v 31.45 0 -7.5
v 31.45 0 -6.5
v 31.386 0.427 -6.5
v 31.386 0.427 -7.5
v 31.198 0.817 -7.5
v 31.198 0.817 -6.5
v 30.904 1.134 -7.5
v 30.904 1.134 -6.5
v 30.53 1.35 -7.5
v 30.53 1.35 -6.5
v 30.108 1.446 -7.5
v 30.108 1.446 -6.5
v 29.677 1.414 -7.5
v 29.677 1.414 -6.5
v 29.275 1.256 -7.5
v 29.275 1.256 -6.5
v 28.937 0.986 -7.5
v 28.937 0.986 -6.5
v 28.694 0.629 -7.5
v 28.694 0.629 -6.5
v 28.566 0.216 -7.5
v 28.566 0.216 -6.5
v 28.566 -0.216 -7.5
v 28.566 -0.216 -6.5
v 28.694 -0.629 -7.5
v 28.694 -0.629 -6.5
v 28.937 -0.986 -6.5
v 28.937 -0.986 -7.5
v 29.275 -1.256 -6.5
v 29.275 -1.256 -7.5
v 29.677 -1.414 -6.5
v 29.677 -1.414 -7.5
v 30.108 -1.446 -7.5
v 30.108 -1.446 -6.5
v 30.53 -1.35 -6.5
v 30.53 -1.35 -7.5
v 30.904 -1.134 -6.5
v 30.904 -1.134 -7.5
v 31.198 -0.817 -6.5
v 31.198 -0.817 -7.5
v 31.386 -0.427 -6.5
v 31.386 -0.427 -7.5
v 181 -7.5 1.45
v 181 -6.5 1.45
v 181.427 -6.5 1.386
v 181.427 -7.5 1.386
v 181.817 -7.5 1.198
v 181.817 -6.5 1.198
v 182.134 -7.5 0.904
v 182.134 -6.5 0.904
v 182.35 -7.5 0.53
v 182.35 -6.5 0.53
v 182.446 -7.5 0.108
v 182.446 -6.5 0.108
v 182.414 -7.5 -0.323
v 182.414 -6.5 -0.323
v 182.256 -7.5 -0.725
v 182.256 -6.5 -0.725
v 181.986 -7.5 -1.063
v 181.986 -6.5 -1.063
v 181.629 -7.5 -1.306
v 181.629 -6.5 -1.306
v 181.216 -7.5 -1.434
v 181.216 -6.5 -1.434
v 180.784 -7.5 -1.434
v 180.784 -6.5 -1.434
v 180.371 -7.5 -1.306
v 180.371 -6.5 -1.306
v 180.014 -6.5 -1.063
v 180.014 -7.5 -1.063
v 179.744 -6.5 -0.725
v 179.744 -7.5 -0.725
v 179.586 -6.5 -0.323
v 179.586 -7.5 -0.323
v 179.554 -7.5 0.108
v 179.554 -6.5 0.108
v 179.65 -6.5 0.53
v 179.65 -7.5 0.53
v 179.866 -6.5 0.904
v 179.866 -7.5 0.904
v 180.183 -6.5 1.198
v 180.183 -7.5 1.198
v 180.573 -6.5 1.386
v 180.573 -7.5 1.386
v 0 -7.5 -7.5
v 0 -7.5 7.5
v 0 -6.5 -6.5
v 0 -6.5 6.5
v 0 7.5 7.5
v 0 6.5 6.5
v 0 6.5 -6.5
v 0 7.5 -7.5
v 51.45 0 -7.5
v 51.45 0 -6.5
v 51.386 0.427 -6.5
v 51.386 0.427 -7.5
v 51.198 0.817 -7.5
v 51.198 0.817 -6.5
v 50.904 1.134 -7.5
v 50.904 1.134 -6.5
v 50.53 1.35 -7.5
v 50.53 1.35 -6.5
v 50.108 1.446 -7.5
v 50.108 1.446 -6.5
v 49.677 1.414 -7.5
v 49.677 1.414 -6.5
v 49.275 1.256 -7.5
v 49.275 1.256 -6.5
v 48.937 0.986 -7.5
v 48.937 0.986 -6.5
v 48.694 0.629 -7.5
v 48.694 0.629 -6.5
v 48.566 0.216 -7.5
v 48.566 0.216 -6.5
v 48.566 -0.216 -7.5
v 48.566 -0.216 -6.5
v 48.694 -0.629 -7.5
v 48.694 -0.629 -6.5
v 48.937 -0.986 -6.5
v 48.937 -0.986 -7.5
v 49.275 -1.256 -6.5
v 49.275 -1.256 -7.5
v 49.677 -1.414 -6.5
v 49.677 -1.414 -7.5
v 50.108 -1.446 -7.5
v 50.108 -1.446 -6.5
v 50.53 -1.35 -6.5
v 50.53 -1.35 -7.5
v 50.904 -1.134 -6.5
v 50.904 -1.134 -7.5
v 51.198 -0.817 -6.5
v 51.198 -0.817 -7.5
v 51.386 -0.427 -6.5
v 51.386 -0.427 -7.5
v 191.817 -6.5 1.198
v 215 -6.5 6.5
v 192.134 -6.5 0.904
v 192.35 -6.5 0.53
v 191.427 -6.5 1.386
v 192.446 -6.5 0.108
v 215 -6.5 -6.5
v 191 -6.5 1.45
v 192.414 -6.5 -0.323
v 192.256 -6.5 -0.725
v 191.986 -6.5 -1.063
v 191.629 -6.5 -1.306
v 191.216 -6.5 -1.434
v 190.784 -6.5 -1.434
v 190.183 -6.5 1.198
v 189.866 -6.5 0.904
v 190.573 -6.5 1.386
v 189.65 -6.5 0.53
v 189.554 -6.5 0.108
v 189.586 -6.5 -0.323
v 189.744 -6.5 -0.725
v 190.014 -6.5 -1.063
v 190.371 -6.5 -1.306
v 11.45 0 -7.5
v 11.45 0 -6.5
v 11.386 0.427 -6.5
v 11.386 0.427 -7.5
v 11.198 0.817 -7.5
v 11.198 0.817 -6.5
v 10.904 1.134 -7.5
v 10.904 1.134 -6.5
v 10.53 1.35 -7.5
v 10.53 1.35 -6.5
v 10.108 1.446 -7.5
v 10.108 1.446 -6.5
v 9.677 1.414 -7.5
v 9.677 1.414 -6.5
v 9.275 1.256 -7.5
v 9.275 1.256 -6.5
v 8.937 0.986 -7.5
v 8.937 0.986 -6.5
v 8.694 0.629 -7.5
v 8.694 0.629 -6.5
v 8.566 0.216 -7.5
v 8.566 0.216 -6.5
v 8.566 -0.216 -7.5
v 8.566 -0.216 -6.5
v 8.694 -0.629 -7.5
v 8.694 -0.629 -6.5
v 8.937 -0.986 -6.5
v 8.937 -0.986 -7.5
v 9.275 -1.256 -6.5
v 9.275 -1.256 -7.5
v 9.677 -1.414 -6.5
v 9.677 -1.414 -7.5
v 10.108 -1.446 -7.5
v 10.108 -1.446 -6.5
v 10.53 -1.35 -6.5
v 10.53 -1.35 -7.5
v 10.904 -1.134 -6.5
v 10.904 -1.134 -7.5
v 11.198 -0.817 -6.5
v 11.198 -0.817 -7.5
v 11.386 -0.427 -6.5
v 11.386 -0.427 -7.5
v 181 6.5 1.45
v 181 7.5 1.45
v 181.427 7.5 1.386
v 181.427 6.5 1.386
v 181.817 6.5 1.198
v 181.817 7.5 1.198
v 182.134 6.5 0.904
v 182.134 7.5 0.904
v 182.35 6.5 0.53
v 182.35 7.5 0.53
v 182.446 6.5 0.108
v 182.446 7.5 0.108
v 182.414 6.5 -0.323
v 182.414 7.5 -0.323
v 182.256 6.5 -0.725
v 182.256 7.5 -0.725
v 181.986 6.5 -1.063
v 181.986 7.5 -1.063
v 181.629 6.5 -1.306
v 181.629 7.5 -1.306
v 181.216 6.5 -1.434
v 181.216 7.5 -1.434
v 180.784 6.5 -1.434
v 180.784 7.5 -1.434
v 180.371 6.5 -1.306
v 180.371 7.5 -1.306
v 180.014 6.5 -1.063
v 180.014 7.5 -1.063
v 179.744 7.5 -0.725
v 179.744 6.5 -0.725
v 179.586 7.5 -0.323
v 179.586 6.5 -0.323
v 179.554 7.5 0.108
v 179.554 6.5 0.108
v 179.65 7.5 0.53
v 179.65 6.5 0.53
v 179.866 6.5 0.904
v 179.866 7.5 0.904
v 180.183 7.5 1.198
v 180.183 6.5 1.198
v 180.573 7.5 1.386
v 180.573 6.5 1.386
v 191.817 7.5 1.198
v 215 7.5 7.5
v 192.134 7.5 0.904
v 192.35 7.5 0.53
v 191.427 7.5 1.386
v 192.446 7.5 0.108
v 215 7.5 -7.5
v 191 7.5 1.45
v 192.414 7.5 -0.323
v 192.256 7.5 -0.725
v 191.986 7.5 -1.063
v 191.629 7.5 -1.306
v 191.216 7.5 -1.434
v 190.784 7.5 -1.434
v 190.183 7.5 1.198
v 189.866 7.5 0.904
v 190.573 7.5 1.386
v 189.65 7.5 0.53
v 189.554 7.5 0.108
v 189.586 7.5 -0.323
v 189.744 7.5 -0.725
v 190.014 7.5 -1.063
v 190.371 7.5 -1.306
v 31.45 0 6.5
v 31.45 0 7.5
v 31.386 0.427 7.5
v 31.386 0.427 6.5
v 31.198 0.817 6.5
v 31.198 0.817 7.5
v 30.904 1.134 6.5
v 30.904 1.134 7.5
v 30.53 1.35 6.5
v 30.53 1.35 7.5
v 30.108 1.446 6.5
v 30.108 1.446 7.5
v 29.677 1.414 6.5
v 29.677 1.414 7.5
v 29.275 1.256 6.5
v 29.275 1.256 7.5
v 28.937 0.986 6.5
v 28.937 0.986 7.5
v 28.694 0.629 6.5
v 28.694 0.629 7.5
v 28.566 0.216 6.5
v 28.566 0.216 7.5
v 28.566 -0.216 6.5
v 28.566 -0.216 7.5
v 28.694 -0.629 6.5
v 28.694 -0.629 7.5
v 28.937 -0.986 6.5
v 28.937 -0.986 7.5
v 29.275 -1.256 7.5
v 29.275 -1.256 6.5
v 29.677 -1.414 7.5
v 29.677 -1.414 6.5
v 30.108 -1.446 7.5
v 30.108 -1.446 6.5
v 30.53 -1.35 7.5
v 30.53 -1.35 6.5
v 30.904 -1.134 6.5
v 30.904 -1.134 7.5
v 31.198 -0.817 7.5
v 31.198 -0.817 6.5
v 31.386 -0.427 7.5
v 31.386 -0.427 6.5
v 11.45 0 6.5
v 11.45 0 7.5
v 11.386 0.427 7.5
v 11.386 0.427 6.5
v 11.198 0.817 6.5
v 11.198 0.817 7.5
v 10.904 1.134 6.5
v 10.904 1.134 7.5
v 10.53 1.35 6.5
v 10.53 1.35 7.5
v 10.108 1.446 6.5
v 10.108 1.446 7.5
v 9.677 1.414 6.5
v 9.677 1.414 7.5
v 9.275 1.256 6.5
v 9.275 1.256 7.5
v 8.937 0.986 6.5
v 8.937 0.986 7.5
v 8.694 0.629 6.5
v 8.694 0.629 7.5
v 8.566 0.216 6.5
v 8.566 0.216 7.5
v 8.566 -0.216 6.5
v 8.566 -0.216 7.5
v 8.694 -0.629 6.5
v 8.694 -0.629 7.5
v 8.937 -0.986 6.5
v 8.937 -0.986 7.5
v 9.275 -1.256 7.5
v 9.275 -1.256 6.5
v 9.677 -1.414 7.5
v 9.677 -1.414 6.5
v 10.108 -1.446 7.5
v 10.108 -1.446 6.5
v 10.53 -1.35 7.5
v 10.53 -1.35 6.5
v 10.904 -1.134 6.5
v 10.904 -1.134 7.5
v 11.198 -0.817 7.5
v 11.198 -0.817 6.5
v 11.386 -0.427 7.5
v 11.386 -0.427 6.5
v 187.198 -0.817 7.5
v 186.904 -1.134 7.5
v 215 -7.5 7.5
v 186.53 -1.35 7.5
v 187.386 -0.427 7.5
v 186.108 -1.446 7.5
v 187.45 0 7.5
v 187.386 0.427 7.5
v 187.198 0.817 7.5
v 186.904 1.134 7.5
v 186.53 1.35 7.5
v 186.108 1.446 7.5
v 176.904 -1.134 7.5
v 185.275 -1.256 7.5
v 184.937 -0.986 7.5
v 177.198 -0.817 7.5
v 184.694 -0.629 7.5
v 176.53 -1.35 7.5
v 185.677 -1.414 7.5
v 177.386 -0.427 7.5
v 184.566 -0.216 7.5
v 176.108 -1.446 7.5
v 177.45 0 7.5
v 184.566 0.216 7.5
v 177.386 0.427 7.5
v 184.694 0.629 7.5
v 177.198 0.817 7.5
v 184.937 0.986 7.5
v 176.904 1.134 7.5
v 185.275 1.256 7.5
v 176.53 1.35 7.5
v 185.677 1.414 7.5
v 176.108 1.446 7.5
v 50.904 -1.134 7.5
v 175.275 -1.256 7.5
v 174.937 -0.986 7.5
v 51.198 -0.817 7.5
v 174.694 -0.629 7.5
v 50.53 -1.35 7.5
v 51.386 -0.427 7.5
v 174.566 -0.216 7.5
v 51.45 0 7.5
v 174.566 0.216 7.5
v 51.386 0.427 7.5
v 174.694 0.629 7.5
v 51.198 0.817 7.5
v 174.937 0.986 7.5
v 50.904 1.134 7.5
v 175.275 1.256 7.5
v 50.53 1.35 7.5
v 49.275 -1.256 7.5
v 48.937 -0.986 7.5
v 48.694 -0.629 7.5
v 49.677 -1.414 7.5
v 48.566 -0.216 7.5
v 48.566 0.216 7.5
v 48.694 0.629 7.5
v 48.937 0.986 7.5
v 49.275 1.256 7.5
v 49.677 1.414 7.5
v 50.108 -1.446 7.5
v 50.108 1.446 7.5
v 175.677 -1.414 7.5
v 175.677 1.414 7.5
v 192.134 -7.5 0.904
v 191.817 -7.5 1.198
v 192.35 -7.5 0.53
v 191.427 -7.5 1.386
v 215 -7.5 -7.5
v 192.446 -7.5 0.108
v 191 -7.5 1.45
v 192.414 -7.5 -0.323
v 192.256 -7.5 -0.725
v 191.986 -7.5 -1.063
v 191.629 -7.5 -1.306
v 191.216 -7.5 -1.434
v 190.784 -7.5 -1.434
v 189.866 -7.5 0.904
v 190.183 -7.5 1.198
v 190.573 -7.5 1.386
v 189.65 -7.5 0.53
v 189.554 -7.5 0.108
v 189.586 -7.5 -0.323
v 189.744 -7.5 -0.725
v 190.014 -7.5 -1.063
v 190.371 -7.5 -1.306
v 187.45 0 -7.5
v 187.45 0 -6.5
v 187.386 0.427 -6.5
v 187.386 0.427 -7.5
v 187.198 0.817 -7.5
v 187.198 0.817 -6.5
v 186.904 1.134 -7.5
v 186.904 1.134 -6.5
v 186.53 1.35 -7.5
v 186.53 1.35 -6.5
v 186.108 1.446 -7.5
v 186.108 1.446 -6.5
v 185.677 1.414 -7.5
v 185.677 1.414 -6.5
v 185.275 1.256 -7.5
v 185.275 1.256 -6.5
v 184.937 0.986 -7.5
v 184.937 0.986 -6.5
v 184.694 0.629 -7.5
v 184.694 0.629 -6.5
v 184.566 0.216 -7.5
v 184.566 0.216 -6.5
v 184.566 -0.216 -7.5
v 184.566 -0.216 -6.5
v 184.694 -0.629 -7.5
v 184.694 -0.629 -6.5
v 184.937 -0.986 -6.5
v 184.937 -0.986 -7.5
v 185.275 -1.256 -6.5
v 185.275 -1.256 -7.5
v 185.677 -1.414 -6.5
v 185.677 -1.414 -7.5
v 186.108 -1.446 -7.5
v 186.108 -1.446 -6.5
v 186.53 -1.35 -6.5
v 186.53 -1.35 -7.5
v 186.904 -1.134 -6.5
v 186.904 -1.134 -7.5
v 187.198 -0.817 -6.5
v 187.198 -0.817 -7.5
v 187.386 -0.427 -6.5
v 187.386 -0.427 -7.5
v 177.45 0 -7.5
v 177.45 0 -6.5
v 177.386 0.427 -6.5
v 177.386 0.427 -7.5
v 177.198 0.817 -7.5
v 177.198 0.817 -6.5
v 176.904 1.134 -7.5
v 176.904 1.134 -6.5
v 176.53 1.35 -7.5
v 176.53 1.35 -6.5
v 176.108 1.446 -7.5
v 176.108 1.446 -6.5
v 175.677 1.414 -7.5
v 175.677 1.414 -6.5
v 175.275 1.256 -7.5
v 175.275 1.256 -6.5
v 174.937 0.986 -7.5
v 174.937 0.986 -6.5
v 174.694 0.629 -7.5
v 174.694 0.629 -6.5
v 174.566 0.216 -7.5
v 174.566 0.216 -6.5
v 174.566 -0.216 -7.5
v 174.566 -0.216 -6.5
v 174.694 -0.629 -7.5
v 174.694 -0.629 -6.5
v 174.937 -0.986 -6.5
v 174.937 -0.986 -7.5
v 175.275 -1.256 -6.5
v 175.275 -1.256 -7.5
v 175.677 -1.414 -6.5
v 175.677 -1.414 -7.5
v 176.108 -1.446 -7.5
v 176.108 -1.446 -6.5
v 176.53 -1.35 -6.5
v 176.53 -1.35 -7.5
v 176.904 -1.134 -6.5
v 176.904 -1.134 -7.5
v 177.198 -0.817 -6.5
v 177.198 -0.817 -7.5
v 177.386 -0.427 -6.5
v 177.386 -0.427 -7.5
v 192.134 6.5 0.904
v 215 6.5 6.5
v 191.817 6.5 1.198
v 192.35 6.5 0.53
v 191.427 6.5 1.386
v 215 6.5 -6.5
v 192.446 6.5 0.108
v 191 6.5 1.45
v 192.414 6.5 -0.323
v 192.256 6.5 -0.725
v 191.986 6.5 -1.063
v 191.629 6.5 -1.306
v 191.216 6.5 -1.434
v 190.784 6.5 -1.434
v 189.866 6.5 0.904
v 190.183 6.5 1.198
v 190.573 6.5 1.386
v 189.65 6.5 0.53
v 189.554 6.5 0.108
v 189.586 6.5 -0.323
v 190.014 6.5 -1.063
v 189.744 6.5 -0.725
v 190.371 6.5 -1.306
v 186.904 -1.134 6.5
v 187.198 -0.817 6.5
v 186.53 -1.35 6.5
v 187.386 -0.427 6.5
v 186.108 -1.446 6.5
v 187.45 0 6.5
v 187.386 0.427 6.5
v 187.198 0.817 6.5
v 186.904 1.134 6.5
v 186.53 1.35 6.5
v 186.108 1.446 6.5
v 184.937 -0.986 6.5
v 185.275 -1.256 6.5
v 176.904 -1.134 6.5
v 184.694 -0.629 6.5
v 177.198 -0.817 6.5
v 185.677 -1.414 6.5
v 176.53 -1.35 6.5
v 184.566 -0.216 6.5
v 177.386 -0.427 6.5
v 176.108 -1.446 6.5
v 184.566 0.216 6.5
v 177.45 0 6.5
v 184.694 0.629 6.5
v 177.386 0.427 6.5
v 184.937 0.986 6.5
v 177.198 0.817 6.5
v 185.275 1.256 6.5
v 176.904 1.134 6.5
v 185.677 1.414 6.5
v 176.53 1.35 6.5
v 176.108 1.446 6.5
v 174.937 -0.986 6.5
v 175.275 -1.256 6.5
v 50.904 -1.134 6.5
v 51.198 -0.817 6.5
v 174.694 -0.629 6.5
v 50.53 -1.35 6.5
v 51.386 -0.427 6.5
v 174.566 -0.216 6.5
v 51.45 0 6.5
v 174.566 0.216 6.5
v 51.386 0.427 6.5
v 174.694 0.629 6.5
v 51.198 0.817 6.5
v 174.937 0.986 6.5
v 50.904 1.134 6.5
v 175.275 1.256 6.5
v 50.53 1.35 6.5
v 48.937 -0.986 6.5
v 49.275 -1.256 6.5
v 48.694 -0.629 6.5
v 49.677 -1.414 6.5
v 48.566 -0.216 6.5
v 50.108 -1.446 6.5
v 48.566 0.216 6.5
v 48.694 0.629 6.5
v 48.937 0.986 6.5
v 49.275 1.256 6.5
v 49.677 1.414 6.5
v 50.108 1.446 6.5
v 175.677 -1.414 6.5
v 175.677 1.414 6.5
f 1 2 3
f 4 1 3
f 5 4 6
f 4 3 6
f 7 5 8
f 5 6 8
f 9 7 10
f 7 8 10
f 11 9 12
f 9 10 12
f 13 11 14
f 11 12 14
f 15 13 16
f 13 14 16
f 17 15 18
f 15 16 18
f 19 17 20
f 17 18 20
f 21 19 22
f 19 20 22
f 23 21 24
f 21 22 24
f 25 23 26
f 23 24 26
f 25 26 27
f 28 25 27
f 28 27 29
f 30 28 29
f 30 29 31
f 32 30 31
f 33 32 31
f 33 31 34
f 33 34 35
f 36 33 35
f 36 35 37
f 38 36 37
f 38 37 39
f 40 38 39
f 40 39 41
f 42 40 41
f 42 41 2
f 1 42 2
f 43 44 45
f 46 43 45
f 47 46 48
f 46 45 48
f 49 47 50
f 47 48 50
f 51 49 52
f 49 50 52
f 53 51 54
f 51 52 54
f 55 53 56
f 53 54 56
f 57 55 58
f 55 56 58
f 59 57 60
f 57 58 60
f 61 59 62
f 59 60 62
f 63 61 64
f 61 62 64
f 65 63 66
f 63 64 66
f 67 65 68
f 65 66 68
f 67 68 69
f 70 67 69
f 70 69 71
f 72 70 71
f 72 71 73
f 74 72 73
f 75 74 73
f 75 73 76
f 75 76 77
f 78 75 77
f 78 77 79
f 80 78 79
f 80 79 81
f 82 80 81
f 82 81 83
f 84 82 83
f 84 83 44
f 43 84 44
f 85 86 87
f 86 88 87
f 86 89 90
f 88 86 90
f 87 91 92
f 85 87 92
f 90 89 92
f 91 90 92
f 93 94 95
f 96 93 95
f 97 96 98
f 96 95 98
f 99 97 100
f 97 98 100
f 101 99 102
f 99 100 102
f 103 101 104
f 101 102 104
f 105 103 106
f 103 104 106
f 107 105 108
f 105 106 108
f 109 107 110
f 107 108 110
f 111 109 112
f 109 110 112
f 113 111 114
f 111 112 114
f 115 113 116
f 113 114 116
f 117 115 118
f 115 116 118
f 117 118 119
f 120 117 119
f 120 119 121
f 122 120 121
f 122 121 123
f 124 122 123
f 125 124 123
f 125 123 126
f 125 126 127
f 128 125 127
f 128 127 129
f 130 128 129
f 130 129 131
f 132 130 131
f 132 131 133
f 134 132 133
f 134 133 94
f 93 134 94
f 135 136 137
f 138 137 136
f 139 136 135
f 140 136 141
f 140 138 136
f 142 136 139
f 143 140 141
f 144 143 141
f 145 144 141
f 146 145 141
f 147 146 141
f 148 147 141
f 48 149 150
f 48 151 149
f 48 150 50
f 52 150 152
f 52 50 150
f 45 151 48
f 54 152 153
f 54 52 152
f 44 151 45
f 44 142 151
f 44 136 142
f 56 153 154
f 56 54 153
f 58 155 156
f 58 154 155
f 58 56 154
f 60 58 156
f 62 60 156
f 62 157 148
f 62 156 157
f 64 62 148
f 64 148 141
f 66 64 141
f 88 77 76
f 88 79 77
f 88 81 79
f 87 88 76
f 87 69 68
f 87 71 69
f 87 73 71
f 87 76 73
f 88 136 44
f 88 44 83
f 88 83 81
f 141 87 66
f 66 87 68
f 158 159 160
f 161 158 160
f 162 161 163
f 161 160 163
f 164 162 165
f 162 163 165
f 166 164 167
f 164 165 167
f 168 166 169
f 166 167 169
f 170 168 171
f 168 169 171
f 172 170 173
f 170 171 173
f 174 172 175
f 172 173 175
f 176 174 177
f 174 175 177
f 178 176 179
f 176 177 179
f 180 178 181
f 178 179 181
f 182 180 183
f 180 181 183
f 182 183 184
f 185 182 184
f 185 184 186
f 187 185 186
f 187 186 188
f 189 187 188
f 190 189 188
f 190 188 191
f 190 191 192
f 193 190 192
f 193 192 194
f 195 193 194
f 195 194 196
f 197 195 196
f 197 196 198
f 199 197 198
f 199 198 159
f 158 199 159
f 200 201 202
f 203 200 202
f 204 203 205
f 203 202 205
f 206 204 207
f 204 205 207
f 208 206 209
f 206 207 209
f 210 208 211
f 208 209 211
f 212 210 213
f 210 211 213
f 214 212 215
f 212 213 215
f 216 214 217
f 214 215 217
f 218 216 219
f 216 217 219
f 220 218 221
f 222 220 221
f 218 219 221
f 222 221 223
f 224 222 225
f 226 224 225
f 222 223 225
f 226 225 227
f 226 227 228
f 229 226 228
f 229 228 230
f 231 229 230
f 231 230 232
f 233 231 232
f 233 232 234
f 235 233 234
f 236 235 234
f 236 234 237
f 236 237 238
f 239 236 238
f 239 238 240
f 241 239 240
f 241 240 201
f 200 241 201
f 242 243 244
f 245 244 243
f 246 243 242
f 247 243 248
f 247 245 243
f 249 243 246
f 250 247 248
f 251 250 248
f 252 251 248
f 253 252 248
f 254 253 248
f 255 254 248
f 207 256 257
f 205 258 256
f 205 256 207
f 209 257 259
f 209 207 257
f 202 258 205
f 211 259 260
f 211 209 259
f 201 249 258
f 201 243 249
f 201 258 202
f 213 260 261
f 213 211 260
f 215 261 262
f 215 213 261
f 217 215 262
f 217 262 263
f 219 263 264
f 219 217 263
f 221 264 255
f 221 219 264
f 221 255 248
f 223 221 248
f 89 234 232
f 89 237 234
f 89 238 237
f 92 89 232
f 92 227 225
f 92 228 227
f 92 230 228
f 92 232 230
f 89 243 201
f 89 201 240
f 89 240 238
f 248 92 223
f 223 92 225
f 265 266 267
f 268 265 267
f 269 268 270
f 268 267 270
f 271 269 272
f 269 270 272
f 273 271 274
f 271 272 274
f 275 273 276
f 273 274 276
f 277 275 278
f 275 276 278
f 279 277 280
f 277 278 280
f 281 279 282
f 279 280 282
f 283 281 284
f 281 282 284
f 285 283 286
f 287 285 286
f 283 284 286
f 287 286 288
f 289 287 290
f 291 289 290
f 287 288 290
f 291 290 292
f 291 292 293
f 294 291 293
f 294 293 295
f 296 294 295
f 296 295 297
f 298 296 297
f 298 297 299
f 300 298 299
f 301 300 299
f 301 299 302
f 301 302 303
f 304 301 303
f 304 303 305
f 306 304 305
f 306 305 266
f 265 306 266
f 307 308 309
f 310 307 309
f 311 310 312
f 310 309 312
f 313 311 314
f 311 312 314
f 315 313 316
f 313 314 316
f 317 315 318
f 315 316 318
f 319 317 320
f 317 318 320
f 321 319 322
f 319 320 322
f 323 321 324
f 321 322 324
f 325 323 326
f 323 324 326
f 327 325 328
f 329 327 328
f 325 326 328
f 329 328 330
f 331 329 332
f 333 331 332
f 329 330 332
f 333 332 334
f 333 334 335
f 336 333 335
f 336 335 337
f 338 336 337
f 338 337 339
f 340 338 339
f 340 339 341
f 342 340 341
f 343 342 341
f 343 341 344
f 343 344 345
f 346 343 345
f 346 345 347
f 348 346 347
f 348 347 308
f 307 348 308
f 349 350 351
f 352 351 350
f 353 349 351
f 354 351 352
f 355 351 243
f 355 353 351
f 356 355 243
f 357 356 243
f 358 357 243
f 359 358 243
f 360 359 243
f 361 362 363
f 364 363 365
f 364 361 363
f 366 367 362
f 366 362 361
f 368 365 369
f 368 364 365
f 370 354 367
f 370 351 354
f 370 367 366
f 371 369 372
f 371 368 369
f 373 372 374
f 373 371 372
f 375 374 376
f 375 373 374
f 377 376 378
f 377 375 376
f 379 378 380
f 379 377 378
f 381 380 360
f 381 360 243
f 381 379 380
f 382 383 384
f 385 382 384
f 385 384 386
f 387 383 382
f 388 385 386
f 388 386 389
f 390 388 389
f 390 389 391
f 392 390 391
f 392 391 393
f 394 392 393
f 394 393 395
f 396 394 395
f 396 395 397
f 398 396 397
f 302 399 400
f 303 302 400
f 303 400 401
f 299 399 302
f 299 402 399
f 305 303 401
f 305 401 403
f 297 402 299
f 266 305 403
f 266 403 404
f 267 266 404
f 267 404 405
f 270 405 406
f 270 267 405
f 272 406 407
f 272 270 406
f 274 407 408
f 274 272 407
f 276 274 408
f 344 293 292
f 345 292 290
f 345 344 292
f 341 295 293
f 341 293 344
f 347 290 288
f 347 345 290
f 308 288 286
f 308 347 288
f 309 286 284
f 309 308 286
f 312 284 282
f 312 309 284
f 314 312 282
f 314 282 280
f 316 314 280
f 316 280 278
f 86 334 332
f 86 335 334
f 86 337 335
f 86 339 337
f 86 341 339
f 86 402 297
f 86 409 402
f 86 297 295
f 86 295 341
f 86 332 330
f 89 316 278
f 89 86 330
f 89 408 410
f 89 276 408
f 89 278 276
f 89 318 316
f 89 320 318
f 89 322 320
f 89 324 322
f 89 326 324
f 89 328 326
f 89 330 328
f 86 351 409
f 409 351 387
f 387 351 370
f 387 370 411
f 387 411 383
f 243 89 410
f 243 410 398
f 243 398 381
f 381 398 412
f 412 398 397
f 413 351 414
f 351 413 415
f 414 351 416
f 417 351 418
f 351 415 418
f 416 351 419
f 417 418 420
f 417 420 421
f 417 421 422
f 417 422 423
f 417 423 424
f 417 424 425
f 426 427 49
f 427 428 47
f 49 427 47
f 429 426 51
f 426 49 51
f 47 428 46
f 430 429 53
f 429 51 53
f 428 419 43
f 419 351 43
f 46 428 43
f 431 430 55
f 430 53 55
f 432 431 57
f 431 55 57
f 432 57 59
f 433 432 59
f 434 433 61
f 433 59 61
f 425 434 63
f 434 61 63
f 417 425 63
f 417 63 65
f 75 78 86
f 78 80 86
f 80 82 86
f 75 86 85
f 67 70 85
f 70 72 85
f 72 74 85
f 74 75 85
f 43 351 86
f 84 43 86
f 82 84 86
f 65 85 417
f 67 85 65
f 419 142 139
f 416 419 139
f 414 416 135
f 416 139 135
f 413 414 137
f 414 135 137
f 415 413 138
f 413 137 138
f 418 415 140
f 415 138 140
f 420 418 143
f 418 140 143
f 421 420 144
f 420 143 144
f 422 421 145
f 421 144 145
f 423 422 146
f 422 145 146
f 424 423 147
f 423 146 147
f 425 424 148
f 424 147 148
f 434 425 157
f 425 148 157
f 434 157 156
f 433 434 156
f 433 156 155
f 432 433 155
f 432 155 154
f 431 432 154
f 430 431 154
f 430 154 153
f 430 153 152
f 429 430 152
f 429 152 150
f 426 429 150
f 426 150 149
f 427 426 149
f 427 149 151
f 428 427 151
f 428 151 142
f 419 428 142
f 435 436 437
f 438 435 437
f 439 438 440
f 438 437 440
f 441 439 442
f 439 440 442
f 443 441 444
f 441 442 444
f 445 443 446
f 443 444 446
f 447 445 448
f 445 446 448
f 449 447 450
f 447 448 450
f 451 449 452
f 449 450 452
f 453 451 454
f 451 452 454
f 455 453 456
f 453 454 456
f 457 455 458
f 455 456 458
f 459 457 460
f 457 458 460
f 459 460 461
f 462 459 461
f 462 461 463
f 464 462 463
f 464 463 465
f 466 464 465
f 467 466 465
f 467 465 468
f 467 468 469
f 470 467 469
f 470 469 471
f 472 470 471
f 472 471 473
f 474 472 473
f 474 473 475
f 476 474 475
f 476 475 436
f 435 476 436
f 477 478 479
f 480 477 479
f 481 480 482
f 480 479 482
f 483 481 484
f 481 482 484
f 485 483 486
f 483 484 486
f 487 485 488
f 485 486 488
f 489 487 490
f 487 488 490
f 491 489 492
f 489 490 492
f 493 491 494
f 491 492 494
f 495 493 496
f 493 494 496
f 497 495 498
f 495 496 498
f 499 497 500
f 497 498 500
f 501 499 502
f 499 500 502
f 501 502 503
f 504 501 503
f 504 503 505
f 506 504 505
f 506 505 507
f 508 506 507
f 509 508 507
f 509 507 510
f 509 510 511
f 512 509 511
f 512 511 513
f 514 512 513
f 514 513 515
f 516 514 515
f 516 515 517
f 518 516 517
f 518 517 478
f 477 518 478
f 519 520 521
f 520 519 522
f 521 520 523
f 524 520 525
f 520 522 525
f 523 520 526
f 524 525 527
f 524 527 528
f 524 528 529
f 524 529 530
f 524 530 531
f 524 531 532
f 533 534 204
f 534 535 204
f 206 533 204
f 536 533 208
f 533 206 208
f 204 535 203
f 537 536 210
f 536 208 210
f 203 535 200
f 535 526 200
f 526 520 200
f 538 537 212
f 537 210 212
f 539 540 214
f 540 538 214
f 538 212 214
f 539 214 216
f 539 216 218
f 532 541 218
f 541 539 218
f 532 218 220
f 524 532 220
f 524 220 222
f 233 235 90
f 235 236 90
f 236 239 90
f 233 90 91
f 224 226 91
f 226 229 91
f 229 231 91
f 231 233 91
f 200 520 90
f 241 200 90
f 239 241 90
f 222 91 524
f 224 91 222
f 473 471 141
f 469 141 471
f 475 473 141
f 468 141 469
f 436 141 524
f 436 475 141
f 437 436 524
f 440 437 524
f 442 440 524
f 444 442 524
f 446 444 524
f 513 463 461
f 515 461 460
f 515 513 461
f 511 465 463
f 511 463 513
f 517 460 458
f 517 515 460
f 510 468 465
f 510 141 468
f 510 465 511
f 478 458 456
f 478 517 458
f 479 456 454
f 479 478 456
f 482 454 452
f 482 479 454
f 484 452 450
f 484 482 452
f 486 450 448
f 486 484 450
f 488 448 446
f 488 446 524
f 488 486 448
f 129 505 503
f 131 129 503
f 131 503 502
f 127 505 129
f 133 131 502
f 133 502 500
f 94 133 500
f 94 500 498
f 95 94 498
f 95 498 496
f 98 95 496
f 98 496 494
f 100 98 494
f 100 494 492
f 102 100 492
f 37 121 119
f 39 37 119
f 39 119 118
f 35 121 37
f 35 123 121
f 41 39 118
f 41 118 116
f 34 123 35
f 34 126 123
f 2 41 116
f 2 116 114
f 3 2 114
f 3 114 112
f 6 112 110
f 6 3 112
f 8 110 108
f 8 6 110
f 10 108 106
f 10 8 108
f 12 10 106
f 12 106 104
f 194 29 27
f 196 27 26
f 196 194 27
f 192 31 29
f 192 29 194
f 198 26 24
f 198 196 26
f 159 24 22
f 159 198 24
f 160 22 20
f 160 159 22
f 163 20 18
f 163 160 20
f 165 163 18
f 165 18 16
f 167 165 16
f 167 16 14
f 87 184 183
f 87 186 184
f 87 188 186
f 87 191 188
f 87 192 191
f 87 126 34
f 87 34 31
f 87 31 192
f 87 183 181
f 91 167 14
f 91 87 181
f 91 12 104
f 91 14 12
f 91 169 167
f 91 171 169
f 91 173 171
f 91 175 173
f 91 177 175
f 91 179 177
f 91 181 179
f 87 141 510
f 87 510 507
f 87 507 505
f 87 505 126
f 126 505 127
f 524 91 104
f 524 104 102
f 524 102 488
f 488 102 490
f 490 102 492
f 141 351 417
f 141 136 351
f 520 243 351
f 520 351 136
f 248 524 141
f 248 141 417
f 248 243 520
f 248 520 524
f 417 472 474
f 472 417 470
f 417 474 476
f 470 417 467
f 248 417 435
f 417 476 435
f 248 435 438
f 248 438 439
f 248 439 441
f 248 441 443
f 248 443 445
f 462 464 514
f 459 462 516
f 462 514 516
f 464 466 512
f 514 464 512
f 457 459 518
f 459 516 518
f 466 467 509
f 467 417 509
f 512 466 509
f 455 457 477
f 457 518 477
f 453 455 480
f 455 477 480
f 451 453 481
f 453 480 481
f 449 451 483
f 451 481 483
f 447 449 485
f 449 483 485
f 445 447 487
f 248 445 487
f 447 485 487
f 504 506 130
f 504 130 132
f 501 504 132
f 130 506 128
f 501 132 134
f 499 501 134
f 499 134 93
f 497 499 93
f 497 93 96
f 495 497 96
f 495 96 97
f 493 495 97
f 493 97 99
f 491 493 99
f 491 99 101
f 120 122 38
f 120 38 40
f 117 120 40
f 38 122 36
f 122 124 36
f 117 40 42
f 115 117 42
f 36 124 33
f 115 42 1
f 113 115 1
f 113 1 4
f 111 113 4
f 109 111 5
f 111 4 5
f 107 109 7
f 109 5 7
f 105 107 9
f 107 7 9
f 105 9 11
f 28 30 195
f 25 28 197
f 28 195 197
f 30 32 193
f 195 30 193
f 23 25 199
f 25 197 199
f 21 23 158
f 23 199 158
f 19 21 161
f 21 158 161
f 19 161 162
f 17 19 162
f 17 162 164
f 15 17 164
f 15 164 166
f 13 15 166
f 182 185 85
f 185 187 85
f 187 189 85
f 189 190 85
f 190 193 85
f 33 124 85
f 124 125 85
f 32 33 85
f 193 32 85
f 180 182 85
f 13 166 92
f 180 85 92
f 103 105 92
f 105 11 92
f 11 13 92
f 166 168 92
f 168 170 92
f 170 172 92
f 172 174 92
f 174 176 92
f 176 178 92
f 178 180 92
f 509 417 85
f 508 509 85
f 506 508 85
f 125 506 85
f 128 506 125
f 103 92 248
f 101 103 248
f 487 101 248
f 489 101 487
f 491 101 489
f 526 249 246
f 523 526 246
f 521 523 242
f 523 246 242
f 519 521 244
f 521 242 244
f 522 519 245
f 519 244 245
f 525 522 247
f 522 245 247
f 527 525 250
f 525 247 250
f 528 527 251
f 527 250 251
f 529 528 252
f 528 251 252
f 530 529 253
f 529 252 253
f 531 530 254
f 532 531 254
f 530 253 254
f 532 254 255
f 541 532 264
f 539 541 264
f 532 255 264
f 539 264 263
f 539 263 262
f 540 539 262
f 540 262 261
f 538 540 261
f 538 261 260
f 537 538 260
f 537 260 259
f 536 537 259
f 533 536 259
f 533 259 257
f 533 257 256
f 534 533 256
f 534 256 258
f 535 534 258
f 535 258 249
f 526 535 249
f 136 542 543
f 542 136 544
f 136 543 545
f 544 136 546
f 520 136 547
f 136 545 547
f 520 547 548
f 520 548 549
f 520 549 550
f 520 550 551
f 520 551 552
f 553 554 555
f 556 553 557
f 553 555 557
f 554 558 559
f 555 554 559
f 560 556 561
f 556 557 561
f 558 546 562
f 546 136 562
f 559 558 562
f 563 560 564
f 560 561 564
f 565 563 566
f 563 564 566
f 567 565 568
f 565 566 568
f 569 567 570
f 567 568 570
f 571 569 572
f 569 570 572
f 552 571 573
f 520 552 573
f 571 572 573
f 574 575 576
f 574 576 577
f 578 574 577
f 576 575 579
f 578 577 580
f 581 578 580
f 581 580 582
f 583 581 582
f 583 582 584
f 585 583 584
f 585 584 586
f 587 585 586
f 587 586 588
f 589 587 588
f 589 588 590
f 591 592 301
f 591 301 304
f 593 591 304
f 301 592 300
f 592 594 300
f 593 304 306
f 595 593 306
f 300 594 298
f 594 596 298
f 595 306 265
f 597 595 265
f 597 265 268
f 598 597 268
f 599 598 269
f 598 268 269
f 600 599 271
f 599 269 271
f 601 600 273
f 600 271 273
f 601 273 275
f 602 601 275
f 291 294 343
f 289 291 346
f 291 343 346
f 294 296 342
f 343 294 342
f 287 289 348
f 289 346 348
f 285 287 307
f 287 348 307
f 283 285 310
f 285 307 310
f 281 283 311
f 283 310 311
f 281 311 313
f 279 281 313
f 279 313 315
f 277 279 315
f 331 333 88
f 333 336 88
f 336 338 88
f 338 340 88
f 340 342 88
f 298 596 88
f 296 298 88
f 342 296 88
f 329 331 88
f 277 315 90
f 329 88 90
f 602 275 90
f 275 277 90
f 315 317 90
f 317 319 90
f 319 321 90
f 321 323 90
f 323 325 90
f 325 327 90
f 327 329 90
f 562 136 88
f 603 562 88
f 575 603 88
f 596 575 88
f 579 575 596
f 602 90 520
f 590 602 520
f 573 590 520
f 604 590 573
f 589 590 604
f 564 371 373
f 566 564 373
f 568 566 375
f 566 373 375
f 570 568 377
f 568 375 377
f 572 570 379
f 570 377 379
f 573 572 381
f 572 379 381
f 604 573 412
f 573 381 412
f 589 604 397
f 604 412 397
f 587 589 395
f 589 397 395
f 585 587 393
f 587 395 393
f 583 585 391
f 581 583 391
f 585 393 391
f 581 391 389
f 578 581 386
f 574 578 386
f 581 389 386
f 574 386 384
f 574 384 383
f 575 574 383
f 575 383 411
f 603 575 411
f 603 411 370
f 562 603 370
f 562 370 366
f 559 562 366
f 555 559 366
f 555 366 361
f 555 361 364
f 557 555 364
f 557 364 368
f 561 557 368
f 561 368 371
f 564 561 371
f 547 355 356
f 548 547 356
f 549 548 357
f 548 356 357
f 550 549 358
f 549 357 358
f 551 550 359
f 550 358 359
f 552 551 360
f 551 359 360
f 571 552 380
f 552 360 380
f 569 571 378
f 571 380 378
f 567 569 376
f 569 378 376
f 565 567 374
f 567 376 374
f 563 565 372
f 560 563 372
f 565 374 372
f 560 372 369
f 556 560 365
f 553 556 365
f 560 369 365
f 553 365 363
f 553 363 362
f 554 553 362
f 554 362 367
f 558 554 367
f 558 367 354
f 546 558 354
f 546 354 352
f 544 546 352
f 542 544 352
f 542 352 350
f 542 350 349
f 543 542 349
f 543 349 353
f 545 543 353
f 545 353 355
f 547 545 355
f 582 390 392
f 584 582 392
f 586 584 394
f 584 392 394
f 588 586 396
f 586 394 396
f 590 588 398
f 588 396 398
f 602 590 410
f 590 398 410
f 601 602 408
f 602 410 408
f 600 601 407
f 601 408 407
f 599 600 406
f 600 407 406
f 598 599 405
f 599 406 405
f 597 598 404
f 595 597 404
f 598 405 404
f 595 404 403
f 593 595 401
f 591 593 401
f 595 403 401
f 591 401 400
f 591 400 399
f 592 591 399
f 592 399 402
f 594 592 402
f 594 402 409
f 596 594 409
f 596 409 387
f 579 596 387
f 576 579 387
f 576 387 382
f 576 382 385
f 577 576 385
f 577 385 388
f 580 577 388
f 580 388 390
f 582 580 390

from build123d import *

# Parameters (mm, degrees)
SKETCH_1_W          = 15
SKETCH_1_H          = 15
SKETCH_1_W_2        = 13
SKETCH_1_H_2        = 13
EXTRUDE_1_DEPTH     = 215
SKETCH_2_R          = 1.45
CUT_EXTRUDE_1_DEPTH = 216.653077882
SKETCH_3_R          = 1.45
CUT_EXTRUDE_2_DEPTH = 216.653077882


with BuildPart() as part:
    # 草图1 → 凸台-拉伸1 (new body)
    with BuildSketch(Plane(origin=(0, 0, 0), x_dir=(0, 0, -1), z_dir=(1, 0, 0))):
        Rectangle(SKETCH_1_W, SKETCH_1_H)
        Rectangle(SKETCH_1_W_2, SKETCH_1_H_2, mode=Mode.SUBTRACT)
    extrude(amount=EXTRUDE_1_DEPTH)

    # 草图2 → 切除-拉伸1 (cut, through all)
    with BuildSketch(Plane.XY.offset(7.5)):
        with Locations((50, 0)):
            Circle(SKETCH_2_R)
        with Locations((30, 0)):
            Circle(SKETCH_2_R)
        with Locations((10, 0)):
            Circle(SKETCH_2_R)
        with Locations((186, 0)):
            Circle(SKETCH_2_R)
        with Locations((176, 0)):
            Circle(SKETCH_2_R)
    extrude(amount=-CUT_EXTRUDE_1_DEPTH, mode=Mode.SUBTRACT)

    # 草图3 → 切除-拉伸2 (cut, through all)
    with BuildSketch(Plane(origin=(0, 7.5, 0), x_dir=(1, 0, 0), z_dir=(0, 1, 0))):
        with Locations(Location((191, 0, 0), (0, 0, 270))):
            Circle(SKETCH_3_R)
        with Locations(Location((181, 0, 0), (0, 0, 270))):
            Circle(SKETCH_3_R)
    extrude(amount=-CUT_EXTRUDE_2_DEPTH, mode=Mode.SUBTRACT)


solid = part.part
